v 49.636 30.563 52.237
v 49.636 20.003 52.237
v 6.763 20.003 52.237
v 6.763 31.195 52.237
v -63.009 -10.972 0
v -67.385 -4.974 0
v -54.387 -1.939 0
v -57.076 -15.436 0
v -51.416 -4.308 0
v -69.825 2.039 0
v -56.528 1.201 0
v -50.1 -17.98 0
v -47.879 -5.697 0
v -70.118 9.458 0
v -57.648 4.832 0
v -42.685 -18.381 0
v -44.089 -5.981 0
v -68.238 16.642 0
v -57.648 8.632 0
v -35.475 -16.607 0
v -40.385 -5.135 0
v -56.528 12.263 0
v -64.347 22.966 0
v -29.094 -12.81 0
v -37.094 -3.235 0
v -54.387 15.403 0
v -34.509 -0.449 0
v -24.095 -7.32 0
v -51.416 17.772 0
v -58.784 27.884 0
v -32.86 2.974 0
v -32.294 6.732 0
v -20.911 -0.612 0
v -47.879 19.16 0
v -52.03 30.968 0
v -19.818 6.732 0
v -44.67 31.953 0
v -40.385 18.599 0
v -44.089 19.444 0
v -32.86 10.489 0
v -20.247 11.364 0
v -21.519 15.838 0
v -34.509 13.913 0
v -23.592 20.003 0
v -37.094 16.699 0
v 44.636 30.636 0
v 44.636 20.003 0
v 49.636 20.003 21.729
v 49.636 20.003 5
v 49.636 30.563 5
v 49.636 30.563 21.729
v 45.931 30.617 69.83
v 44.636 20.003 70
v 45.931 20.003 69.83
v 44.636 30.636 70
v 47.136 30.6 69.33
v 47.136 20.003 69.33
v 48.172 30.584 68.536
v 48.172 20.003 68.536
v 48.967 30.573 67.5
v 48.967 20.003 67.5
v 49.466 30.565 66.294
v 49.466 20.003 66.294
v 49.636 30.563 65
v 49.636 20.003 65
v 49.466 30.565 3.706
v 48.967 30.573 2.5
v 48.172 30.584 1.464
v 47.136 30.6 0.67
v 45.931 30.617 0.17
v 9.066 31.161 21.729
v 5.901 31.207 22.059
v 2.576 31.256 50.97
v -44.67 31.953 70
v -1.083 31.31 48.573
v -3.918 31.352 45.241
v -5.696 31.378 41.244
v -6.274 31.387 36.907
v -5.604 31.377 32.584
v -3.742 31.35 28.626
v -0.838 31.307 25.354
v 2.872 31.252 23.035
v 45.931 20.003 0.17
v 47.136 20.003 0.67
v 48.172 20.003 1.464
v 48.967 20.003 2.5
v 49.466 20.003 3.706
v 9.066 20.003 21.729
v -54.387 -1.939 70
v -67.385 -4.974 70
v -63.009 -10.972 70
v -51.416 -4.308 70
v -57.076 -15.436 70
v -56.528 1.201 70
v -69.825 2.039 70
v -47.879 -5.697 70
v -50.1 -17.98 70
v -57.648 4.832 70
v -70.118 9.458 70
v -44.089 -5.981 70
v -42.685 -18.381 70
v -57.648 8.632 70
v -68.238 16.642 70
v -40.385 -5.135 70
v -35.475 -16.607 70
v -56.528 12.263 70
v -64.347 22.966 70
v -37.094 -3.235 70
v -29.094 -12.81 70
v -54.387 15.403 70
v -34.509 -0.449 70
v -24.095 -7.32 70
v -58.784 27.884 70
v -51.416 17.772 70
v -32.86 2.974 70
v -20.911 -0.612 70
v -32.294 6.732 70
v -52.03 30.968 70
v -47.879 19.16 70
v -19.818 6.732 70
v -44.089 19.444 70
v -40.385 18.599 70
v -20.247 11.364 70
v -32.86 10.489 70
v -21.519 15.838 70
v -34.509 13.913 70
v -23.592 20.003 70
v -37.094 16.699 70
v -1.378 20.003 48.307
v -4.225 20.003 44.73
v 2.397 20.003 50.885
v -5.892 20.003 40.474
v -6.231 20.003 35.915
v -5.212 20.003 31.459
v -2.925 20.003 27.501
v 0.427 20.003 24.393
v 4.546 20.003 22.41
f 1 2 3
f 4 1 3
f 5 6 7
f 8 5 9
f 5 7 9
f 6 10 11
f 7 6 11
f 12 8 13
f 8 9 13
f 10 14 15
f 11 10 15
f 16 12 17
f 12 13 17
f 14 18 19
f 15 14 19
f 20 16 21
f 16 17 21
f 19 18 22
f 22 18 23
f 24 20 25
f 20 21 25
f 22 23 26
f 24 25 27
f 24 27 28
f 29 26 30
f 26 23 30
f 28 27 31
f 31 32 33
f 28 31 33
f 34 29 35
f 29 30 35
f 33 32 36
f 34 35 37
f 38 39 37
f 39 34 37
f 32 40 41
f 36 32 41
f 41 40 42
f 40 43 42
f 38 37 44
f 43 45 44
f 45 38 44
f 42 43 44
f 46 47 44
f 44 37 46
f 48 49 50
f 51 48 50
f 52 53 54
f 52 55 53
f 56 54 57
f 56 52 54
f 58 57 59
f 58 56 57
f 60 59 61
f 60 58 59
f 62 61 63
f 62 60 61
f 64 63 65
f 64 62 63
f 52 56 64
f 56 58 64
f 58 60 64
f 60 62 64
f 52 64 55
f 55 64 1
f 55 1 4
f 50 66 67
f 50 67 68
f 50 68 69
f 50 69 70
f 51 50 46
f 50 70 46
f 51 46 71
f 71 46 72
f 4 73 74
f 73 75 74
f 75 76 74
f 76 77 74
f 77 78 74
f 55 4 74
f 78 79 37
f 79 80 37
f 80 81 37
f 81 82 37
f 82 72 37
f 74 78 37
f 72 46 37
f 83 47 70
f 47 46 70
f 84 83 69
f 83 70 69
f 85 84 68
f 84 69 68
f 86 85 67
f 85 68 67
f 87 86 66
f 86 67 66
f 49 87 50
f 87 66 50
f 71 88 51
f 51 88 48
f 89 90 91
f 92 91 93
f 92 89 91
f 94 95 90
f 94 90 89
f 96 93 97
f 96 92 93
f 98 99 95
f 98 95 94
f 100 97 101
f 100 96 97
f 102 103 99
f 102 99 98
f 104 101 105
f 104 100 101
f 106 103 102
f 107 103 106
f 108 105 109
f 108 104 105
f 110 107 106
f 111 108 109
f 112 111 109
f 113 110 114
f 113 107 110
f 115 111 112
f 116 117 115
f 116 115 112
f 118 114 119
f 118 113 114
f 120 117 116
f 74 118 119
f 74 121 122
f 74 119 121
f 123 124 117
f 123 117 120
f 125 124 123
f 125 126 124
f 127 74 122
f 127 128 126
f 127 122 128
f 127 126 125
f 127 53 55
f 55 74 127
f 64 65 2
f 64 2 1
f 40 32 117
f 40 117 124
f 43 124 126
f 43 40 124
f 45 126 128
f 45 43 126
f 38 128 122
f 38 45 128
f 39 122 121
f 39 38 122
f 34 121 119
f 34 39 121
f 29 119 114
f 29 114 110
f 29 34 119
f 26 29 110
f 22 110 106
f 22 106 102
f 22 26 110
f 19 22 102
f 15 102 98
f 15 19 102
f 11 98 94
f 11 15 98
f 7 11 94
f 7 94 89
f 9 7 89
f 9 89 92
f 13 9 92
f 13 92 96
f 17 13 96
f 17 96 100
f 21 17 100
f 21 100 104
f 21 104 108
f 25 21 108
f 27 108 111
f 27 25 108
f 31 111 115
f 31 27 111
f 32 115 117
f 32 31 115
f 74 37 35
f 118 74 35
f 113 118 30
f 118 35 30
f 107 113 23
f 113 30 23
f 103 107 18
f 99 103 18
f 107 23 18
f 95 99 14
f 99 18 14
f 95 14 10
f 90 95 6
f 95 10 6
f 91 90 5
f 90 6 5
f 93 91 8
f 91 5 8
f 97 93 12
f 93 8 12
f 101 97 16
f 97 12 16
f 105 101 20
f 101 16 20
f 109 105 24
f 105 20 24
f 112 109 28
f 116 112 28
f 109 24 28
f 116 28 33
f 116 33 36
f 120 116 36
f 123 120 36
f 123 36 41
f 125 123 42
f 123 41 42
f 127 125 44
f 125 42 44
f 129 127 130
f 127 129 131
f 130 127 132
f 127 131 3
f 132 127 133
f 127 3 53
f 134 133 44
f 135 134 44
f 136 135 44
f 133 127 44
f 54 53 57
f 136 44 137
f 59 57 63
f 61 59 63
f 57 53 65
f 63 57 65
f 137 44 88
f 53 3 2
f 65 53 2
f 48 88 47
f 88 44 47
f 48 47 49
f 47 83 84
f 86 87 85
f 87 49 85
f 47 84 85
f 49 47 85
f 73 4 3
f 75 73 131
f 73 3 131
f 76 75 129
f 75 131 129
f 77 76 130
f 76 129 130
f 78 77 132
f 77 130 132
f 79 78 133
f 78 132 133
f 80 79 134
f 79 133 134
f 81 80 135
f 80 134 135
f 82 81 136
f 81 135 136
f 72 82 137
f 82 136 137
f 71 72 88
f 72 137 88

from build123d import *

# Parameters (mm, degrees)
F0_R     = 12.748205
F1_DEPTH = 70
F3_DEPTH = 25
F4_R     = 5


with BuildPart() as f1:
    # F0 (on Top) → F1 (new body)
    with BuildSketch(Plane.XY):
        with BuildLine():
            ThreePointArc((-44.670311, 31.952813), (-63.008855, -10.972032), (-19.818391, 6.731877))
            ThreePointArc((-19.818391, 6.731877), (-20.780013, 13.630178), (-23.591557, 20.002501))
            ThreePointArc((-23.591557, 20.002501), (-32.601998, 28.674496), (-44.670311, 31.952813))
        make_face()
        with Locations((-45.042067, 6.731877)):
            Circle(F0_R, mode=Mode.SUBTRACT)
        with BuildLine():
            ThreePointArc((-44.670311, 31.952813), (-32.601998, 28.674496), (-23.591557, 20.002501))
            Line((-23.591557, 20.002501), (49.636481, 20.002501))
            Line((49.636481, 20.002501), (49.636481, 30.562731))
            Line((49.636481, 30.562731), (-44.670311, 31.952813))
        make_face()
    extrude(amount=F1_DEPTH)

    # F2 (on face) → F3 (cut)
    with BuildSketch(Plane.XZ.offset(-20.002501)):
        with BuildLine():
            Line((49.636481, 21.729333), (49.636481, 52.236743))
            Line((49.636481, 52.236743), (6.763435, 52.236743))
            ThreePointArc((6.763435, 52.236743), (-6.231204, 35.915426), (9.065881, 21.729333))
            Line((9.065881, 21.729333), (49.636481, 21.729333))
        make_face()
    extrude(amount=-F3_DEPTH, mode=Mode.SUBTRACT)

    # F4
    f4_edges = [f1.edges().sort_by_distance(p)[0] for p in [
        (49.636481, 25.282616, 70),
        (49.636481, 25.282616, 0),
    ]]
    fillet(f4_edges, radius=F4_R)


solid = f1.part
